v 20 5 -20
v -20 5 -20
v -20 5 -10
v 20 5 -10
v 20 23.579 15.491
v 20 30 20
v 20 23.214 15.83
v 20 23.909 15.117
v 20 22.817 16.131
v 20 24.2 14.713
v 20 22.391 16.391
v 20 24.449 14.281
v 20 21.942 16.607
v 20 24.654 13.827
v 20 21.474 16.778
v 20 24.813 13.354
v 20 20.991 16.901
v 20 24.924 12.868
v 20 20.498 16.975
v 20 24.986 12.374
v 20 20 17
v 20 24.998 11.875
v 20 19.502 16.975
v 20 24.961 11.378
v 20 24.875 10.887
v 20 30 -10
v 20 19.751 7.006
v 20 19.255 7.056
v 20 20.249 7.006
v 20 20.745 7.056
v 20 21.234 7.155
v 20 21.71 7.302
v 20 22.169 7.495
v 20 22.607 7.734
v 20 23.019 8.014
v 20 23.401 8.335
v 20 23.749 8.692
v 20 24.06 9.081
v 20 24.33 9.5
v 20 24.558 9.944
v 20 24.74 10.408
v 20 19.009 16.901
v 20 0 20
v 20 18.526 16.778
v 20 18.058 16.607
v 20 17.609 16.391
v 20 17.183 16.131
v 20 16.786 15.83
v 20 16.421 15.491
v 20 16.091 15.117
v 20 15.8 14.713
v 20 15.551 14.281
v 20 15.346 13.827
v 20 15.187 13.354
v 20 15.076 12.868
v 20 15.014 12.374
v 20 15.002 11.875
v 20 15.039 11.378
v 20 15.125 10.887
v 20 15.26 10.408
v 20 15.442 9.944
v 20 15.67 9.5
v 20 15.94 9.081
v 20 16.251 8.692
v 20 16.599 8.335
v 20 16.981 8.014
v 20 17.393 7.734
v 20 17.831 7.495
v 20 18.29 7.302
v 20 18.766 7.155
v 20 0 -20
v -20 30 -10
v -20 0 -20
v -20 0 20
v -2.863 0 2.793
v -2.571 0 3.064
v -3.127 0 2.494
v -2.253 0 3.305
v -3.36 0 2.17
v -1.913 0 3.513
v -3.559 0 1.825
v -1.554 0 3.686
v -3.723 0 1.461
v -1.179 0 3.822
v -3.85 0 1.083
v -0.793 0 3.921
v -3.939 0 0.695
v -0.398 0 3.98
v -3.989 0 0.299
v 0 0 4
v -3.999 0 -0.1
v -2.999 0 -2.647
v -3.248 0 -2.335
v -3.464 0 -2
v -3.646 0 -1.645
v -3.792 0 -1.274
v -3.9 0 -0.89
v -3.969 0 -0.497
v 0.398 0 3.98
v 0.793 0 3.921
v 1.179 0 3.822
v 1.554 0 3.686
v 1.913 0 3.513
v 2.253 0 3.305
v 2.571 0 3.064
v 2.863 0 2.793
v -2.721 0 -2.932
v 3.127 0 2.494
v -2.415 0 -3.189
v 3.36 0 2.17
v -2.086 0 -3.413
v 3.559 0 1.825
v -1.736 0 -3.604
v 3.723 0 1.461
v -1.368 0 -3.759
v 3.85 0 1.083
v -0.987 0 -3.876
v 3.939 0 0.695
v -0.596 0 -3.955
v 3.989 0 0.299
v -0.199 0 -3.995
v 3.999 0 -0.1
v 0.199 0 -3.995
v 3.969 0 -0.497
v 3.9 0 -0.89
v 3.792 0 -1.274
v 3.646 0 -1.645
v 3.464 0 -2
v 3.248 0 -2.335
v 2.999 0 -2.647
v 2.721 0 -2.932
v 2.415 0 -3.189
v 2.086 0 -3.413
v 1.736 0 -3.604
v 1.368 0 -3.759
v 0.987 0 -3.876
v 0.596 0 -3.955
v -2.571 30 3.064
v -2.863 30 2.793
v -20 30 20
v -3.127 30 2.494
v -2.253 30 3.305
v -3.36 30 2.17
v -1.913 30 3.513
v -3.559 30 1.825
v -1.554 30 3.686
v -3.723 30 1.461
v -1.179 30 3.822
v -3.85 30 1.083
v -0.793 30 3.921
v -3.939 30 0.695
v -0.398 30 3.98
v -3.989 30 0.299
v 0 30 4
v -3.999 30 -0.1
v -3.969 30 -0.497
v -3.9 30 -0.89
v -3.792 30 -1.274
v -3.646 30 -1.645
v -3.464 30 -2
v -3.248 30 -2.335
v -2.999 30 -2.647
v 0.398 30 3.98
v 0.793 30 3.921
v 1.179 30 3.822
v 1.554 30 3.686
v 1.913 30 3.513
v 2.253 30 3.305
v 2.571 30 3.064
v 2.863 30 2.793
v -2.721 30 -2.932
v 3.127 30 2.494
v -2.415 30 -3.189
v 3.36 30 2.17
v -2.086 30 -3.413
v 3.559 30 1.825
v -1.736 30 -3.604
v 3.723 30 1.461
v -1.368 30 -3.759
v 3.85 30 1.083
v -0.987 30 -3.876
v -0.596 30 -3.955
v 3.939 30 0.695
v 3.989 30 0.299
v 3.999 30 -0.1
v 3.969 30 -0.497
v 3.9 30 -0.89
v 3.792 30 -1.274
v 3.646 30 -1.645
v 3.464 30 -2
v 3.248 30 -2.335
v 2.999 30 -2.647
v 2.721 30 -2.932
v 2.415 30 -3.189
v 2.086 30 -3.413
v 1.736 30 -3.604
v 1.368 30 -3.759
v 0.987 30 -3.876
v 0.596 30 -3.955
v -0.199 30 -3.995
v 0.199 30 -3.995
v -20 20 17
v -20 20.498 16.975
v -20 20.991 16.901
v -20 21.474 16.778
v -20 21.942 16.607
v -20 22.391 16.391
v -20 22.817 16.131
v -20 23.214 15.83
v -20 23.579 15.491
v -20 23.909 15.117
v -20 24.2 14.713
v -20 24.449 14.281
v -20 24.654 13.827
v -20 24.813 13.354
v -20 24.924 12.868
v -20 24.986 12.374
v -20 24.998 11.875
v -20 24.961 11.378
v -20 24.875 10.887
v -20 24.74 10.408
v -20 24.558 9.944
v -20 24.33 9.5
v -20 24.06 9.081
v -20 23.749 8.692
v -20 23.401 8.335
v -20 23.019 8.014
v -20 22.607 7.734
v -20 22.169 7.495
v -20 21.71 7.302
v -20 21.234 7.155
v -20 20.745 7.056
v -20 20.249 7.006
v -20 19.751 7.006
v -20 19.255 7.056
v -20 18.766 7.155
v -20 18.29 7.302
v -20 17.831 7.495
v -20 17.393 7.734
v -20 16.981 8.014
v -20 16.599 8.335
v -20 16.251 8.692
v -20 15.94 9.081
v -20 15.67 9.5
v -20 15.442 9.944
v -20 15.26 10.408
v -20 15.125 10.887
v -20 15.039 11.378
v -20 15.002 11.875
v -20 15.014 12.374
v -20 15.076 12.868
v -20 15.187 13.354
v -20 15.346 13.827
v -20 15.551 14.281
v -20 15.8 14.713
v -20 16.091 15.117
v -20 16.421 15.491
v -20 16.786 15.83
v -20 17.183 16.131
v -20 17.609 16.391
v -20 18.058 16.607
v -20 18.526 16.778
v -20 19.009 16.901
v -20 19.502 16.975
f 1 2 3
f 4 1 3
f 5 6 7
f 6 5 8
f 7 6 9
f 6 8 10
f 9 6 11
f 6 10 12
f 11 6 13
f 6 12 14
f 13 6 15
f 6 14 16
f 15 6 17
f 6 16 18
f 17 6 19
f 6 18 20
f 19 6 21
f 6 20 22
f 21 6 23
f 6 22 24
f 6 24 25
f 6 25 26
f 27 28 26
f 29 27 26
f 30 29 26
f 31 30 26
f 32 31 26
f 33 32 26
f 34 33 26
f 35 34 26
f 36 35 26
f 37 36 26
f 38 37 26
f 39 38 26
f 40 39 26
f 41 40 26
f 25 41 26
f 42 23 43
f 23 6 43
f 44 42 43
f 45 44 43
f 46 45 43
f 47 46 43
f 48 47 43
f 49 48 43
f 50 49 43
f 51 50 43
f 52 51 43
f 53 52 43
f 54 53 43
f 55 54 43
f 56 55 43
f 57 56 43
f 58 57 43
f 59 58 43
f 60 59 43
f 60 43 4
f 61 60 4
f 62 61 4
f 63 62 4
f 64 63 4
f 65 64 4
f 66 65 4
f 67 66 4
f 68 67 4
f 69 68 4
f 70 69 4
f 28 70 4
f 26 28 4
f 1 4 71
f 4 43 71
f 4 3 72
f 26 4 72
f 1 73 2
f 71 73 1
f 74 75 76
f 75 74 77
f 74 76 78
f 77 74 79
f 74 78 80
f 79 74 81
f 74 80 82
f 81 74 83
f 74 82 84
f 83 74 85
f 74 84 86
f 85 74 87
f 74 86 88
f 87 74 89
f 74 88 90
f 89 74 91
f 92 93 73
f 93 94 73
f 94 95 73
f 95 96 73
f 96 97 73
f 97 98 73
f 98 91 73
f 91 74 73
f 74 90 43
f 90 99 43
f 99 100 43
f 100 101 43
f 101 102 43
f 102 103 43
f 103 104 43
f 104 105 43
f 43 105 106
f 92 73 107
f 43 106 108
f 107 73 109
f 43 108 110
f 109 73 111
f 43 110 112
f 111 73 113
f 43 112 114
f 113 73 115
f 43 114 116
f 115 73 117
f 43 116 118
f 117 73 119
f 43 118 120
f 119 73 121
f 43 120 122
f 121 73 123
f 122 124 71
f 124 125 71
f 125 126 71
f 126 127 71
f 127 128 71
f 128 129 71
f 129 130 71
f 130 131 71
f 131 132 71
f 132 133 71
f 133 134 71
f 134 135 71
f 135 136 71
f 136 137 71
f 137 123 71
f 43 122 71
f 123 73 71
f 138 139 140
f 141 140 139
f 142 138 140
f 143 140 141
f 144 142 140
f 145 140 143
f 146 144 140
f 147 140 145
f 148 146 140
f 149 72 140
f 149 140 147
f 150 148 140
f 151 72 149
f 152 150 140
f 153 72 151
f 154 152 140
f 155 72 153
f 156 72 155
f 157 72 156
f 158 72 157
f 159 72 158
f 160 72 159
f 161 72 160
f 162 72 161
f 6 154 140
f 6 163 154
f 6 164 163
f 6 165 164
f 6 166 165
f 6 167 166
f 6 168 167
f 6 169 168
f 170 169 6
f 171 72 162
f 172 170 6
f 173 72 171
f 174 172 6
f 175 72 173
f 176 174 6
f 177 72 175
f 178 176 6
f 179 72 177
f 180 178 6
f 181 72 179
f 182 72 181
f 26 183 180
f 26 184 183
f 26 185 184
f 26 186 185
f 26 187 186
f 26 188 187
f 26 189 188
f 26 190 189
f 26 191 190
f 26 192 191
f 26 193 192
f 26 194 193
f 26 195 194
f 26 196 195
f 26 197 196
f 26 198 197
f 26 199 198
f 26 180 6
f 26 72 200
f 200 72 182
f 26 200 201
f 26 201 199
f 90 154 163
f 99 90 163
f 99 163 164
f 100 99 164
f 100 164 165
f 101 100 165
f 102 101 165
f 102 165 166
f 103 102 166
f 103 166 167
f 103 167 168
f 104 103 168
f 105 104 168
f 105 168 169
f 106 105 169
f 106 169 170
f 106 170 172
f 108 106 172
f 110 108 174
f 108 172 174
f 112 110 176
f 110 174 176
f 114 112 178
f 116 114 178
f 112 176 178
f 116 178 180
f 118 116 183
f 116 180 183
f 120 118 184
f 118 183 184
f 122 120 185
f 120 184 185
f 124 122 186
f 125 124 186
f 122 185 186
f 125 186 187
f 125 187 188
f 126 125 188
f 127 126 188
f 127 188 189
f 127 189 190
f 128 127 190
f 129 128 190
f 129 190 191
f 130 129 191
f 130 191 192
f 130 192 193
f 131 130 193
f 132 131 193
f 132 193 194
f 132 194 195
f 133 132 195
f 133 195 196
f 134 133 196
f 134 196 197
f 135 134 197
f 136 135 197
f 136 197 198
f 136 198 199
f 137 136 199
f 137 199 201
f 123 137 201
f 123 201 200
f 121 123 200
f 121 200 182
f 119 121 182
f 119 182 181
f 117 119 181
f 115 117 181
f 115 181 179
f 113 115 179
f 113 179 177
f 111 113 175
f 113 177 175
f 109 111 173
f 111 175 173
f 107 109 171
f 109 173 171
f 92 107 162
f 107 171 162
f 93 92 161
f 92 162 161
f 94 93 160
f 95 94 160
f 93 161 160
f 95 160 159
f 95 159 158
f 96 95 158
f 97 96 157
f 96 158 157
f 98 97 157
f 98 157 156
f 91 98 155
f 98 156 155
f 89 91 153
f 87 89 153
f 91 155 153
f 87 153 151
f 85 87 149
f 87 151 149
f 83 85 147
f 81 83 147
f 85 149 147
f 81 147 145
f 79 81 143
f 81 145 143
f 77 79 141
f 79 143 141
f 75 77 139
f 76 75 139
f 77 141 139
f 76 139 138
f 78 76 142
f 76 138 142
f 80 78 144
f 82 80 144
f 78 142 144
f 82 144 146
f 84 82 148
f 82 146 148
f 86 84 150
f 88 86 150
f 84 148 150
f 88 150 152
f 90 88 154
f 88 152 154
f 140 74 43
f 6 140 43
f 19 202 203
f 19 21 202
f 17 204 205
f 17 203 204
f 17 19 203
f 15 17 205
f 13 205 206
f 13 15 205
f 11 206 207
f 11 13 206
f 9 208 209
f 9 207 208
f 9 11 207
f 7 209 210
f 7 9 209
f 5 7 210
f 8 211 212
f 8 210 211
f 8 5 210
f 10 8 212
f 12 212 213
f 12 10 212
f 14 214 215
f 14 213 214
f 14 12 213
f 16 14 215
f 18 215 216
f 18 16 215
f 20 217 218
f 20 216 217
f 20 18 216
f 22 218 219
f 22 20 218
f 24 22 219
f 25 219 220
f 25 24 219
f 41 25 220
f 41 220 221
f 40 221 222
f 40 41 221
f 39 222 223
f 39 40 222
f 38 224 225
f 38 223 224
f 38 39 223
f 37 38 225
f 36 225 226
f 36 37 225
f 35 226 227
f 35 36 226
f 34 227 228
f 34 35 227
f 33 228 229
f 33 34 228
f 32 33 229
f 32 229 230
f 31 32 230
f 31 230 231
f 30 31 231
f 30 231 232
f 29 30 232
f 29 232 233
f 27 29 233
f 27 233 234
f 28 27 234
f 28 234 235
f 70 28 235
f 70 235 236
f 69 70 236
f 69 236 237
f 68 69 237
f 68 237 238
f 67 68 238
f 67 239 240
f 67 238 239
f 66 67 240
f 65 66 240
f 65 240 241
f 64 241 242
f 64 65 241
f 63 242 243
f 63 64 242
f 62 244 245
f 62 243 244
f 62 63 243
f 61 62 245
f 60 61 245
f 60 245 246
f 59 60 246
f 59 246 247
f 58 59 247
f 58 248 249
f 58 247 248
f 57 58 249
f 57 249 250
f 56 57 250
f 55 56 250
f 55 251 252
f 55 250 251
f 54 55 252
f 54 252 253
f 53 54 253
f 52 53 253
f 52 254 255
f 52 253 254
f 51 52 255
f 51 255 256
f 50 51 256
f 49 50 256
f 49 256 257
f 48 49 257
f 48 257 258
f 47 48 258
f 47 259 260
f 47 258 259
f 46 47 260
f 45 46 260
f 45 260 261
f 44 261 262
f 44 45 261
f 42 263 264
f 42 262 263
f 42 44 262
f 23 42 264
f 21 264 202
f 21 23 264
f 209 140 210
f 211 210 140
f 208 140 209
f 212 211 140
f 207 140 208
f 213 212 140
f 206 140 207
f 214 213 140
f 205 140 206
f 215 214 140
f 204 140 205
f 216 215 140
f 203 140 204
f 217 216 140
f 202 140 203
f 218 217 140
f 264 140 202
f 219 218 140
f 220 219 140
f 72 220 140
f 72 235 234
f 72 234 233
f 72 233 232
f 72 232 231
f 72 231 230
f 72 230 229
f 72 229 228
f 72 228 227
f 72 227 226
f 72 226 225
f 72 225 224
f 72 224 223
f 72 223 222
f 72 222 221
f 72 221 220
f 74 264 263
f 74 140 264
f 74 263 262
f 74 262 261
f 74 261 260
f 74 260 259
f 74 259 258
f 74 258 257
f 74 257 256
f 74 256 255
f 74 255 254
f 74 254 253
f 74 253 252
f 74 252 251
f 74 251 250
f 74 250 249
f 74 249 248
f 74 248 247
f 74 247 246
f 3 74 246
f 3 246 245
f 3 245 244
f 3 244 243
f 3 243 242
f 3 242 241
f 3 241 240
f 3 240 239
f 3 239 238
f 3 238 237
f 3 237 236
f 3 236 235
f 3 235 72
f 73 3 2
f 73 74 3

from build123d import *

# Parameters (mm, degrees)
SKETCH1_W               = 40
SKETCH1_H               = 40
BOSS_EXTRUDE1_DEPTH     = 30
SKETCH2_R               = 4
CUT_EXTRUDE1_DEPTH      = 42.231056256
CUT_EXTRUDE2_DEPTH      = 54.851648071
CUT_EXTRUDE2_DEPTH_BACK = 54.851648071
SKETCH3_R               = 5
SKETCH4_W               = 10
SKETCH4_H               = 25
CUT_EXTRUDE3_DEPTH      = 54.851648071


with BuildPart() as part:
    # Sketch1 → Boss-Extrude1 (new body)
    with BuildSketch(Plane(origin=(0, 0, 0), x_dir=(1, 0, 0), z_dir=(0, 1, 0))):
        Rectangle(SKETCH1_W, SKETCH1_H)
    extrude(amount=BOSS_EXTRUDE1_DEPTH)

    # Sketch2 → Cut-Extrude1 (cut, through all)
    with BuildSketch(Plane(origin=(0, 30, 0), x_dir=(1, 0, 0), z_dir=(0, 1, 0))):
        with Locations(Location((0, 0, 0), (0, 0, 270))):
            Circle(SKETCH2_R)
    extrude(amount=-CUT_EXTRUDE1_DEPTH, mode=Mode.SUBTRACT)

    # Sketch3 → Cut-Extrude2 (cut, two sides: drawn at the far end of the back side and taken through both)
    with BuildSketch(Plane.ZY.offset(20).offset(-CUT_EXTRUDE2_DEPTH_BACK)):
        with Locations((12, 20)):
            Circle(SKETCH3_R)
    extrude(amount=CUT_EXTRUDE2_DEPTH + CUT_EXTRUDE2_DEPTH_BACK, mode=Mode.SUBTRACT)

    # Sketch4 → Cut-Extrude3 (cut, through all)
    with BuildSketch(Plane.ZY.offset(20)):
        with Locations((-15, 17.5)):
            Rectangle(SKETCH4_W, SKETCH4_H)
    extrude(amount=-CUT_EXTRUDE3_DEPTH, mode=Mode.SUBTRACT)


solid = part.part
